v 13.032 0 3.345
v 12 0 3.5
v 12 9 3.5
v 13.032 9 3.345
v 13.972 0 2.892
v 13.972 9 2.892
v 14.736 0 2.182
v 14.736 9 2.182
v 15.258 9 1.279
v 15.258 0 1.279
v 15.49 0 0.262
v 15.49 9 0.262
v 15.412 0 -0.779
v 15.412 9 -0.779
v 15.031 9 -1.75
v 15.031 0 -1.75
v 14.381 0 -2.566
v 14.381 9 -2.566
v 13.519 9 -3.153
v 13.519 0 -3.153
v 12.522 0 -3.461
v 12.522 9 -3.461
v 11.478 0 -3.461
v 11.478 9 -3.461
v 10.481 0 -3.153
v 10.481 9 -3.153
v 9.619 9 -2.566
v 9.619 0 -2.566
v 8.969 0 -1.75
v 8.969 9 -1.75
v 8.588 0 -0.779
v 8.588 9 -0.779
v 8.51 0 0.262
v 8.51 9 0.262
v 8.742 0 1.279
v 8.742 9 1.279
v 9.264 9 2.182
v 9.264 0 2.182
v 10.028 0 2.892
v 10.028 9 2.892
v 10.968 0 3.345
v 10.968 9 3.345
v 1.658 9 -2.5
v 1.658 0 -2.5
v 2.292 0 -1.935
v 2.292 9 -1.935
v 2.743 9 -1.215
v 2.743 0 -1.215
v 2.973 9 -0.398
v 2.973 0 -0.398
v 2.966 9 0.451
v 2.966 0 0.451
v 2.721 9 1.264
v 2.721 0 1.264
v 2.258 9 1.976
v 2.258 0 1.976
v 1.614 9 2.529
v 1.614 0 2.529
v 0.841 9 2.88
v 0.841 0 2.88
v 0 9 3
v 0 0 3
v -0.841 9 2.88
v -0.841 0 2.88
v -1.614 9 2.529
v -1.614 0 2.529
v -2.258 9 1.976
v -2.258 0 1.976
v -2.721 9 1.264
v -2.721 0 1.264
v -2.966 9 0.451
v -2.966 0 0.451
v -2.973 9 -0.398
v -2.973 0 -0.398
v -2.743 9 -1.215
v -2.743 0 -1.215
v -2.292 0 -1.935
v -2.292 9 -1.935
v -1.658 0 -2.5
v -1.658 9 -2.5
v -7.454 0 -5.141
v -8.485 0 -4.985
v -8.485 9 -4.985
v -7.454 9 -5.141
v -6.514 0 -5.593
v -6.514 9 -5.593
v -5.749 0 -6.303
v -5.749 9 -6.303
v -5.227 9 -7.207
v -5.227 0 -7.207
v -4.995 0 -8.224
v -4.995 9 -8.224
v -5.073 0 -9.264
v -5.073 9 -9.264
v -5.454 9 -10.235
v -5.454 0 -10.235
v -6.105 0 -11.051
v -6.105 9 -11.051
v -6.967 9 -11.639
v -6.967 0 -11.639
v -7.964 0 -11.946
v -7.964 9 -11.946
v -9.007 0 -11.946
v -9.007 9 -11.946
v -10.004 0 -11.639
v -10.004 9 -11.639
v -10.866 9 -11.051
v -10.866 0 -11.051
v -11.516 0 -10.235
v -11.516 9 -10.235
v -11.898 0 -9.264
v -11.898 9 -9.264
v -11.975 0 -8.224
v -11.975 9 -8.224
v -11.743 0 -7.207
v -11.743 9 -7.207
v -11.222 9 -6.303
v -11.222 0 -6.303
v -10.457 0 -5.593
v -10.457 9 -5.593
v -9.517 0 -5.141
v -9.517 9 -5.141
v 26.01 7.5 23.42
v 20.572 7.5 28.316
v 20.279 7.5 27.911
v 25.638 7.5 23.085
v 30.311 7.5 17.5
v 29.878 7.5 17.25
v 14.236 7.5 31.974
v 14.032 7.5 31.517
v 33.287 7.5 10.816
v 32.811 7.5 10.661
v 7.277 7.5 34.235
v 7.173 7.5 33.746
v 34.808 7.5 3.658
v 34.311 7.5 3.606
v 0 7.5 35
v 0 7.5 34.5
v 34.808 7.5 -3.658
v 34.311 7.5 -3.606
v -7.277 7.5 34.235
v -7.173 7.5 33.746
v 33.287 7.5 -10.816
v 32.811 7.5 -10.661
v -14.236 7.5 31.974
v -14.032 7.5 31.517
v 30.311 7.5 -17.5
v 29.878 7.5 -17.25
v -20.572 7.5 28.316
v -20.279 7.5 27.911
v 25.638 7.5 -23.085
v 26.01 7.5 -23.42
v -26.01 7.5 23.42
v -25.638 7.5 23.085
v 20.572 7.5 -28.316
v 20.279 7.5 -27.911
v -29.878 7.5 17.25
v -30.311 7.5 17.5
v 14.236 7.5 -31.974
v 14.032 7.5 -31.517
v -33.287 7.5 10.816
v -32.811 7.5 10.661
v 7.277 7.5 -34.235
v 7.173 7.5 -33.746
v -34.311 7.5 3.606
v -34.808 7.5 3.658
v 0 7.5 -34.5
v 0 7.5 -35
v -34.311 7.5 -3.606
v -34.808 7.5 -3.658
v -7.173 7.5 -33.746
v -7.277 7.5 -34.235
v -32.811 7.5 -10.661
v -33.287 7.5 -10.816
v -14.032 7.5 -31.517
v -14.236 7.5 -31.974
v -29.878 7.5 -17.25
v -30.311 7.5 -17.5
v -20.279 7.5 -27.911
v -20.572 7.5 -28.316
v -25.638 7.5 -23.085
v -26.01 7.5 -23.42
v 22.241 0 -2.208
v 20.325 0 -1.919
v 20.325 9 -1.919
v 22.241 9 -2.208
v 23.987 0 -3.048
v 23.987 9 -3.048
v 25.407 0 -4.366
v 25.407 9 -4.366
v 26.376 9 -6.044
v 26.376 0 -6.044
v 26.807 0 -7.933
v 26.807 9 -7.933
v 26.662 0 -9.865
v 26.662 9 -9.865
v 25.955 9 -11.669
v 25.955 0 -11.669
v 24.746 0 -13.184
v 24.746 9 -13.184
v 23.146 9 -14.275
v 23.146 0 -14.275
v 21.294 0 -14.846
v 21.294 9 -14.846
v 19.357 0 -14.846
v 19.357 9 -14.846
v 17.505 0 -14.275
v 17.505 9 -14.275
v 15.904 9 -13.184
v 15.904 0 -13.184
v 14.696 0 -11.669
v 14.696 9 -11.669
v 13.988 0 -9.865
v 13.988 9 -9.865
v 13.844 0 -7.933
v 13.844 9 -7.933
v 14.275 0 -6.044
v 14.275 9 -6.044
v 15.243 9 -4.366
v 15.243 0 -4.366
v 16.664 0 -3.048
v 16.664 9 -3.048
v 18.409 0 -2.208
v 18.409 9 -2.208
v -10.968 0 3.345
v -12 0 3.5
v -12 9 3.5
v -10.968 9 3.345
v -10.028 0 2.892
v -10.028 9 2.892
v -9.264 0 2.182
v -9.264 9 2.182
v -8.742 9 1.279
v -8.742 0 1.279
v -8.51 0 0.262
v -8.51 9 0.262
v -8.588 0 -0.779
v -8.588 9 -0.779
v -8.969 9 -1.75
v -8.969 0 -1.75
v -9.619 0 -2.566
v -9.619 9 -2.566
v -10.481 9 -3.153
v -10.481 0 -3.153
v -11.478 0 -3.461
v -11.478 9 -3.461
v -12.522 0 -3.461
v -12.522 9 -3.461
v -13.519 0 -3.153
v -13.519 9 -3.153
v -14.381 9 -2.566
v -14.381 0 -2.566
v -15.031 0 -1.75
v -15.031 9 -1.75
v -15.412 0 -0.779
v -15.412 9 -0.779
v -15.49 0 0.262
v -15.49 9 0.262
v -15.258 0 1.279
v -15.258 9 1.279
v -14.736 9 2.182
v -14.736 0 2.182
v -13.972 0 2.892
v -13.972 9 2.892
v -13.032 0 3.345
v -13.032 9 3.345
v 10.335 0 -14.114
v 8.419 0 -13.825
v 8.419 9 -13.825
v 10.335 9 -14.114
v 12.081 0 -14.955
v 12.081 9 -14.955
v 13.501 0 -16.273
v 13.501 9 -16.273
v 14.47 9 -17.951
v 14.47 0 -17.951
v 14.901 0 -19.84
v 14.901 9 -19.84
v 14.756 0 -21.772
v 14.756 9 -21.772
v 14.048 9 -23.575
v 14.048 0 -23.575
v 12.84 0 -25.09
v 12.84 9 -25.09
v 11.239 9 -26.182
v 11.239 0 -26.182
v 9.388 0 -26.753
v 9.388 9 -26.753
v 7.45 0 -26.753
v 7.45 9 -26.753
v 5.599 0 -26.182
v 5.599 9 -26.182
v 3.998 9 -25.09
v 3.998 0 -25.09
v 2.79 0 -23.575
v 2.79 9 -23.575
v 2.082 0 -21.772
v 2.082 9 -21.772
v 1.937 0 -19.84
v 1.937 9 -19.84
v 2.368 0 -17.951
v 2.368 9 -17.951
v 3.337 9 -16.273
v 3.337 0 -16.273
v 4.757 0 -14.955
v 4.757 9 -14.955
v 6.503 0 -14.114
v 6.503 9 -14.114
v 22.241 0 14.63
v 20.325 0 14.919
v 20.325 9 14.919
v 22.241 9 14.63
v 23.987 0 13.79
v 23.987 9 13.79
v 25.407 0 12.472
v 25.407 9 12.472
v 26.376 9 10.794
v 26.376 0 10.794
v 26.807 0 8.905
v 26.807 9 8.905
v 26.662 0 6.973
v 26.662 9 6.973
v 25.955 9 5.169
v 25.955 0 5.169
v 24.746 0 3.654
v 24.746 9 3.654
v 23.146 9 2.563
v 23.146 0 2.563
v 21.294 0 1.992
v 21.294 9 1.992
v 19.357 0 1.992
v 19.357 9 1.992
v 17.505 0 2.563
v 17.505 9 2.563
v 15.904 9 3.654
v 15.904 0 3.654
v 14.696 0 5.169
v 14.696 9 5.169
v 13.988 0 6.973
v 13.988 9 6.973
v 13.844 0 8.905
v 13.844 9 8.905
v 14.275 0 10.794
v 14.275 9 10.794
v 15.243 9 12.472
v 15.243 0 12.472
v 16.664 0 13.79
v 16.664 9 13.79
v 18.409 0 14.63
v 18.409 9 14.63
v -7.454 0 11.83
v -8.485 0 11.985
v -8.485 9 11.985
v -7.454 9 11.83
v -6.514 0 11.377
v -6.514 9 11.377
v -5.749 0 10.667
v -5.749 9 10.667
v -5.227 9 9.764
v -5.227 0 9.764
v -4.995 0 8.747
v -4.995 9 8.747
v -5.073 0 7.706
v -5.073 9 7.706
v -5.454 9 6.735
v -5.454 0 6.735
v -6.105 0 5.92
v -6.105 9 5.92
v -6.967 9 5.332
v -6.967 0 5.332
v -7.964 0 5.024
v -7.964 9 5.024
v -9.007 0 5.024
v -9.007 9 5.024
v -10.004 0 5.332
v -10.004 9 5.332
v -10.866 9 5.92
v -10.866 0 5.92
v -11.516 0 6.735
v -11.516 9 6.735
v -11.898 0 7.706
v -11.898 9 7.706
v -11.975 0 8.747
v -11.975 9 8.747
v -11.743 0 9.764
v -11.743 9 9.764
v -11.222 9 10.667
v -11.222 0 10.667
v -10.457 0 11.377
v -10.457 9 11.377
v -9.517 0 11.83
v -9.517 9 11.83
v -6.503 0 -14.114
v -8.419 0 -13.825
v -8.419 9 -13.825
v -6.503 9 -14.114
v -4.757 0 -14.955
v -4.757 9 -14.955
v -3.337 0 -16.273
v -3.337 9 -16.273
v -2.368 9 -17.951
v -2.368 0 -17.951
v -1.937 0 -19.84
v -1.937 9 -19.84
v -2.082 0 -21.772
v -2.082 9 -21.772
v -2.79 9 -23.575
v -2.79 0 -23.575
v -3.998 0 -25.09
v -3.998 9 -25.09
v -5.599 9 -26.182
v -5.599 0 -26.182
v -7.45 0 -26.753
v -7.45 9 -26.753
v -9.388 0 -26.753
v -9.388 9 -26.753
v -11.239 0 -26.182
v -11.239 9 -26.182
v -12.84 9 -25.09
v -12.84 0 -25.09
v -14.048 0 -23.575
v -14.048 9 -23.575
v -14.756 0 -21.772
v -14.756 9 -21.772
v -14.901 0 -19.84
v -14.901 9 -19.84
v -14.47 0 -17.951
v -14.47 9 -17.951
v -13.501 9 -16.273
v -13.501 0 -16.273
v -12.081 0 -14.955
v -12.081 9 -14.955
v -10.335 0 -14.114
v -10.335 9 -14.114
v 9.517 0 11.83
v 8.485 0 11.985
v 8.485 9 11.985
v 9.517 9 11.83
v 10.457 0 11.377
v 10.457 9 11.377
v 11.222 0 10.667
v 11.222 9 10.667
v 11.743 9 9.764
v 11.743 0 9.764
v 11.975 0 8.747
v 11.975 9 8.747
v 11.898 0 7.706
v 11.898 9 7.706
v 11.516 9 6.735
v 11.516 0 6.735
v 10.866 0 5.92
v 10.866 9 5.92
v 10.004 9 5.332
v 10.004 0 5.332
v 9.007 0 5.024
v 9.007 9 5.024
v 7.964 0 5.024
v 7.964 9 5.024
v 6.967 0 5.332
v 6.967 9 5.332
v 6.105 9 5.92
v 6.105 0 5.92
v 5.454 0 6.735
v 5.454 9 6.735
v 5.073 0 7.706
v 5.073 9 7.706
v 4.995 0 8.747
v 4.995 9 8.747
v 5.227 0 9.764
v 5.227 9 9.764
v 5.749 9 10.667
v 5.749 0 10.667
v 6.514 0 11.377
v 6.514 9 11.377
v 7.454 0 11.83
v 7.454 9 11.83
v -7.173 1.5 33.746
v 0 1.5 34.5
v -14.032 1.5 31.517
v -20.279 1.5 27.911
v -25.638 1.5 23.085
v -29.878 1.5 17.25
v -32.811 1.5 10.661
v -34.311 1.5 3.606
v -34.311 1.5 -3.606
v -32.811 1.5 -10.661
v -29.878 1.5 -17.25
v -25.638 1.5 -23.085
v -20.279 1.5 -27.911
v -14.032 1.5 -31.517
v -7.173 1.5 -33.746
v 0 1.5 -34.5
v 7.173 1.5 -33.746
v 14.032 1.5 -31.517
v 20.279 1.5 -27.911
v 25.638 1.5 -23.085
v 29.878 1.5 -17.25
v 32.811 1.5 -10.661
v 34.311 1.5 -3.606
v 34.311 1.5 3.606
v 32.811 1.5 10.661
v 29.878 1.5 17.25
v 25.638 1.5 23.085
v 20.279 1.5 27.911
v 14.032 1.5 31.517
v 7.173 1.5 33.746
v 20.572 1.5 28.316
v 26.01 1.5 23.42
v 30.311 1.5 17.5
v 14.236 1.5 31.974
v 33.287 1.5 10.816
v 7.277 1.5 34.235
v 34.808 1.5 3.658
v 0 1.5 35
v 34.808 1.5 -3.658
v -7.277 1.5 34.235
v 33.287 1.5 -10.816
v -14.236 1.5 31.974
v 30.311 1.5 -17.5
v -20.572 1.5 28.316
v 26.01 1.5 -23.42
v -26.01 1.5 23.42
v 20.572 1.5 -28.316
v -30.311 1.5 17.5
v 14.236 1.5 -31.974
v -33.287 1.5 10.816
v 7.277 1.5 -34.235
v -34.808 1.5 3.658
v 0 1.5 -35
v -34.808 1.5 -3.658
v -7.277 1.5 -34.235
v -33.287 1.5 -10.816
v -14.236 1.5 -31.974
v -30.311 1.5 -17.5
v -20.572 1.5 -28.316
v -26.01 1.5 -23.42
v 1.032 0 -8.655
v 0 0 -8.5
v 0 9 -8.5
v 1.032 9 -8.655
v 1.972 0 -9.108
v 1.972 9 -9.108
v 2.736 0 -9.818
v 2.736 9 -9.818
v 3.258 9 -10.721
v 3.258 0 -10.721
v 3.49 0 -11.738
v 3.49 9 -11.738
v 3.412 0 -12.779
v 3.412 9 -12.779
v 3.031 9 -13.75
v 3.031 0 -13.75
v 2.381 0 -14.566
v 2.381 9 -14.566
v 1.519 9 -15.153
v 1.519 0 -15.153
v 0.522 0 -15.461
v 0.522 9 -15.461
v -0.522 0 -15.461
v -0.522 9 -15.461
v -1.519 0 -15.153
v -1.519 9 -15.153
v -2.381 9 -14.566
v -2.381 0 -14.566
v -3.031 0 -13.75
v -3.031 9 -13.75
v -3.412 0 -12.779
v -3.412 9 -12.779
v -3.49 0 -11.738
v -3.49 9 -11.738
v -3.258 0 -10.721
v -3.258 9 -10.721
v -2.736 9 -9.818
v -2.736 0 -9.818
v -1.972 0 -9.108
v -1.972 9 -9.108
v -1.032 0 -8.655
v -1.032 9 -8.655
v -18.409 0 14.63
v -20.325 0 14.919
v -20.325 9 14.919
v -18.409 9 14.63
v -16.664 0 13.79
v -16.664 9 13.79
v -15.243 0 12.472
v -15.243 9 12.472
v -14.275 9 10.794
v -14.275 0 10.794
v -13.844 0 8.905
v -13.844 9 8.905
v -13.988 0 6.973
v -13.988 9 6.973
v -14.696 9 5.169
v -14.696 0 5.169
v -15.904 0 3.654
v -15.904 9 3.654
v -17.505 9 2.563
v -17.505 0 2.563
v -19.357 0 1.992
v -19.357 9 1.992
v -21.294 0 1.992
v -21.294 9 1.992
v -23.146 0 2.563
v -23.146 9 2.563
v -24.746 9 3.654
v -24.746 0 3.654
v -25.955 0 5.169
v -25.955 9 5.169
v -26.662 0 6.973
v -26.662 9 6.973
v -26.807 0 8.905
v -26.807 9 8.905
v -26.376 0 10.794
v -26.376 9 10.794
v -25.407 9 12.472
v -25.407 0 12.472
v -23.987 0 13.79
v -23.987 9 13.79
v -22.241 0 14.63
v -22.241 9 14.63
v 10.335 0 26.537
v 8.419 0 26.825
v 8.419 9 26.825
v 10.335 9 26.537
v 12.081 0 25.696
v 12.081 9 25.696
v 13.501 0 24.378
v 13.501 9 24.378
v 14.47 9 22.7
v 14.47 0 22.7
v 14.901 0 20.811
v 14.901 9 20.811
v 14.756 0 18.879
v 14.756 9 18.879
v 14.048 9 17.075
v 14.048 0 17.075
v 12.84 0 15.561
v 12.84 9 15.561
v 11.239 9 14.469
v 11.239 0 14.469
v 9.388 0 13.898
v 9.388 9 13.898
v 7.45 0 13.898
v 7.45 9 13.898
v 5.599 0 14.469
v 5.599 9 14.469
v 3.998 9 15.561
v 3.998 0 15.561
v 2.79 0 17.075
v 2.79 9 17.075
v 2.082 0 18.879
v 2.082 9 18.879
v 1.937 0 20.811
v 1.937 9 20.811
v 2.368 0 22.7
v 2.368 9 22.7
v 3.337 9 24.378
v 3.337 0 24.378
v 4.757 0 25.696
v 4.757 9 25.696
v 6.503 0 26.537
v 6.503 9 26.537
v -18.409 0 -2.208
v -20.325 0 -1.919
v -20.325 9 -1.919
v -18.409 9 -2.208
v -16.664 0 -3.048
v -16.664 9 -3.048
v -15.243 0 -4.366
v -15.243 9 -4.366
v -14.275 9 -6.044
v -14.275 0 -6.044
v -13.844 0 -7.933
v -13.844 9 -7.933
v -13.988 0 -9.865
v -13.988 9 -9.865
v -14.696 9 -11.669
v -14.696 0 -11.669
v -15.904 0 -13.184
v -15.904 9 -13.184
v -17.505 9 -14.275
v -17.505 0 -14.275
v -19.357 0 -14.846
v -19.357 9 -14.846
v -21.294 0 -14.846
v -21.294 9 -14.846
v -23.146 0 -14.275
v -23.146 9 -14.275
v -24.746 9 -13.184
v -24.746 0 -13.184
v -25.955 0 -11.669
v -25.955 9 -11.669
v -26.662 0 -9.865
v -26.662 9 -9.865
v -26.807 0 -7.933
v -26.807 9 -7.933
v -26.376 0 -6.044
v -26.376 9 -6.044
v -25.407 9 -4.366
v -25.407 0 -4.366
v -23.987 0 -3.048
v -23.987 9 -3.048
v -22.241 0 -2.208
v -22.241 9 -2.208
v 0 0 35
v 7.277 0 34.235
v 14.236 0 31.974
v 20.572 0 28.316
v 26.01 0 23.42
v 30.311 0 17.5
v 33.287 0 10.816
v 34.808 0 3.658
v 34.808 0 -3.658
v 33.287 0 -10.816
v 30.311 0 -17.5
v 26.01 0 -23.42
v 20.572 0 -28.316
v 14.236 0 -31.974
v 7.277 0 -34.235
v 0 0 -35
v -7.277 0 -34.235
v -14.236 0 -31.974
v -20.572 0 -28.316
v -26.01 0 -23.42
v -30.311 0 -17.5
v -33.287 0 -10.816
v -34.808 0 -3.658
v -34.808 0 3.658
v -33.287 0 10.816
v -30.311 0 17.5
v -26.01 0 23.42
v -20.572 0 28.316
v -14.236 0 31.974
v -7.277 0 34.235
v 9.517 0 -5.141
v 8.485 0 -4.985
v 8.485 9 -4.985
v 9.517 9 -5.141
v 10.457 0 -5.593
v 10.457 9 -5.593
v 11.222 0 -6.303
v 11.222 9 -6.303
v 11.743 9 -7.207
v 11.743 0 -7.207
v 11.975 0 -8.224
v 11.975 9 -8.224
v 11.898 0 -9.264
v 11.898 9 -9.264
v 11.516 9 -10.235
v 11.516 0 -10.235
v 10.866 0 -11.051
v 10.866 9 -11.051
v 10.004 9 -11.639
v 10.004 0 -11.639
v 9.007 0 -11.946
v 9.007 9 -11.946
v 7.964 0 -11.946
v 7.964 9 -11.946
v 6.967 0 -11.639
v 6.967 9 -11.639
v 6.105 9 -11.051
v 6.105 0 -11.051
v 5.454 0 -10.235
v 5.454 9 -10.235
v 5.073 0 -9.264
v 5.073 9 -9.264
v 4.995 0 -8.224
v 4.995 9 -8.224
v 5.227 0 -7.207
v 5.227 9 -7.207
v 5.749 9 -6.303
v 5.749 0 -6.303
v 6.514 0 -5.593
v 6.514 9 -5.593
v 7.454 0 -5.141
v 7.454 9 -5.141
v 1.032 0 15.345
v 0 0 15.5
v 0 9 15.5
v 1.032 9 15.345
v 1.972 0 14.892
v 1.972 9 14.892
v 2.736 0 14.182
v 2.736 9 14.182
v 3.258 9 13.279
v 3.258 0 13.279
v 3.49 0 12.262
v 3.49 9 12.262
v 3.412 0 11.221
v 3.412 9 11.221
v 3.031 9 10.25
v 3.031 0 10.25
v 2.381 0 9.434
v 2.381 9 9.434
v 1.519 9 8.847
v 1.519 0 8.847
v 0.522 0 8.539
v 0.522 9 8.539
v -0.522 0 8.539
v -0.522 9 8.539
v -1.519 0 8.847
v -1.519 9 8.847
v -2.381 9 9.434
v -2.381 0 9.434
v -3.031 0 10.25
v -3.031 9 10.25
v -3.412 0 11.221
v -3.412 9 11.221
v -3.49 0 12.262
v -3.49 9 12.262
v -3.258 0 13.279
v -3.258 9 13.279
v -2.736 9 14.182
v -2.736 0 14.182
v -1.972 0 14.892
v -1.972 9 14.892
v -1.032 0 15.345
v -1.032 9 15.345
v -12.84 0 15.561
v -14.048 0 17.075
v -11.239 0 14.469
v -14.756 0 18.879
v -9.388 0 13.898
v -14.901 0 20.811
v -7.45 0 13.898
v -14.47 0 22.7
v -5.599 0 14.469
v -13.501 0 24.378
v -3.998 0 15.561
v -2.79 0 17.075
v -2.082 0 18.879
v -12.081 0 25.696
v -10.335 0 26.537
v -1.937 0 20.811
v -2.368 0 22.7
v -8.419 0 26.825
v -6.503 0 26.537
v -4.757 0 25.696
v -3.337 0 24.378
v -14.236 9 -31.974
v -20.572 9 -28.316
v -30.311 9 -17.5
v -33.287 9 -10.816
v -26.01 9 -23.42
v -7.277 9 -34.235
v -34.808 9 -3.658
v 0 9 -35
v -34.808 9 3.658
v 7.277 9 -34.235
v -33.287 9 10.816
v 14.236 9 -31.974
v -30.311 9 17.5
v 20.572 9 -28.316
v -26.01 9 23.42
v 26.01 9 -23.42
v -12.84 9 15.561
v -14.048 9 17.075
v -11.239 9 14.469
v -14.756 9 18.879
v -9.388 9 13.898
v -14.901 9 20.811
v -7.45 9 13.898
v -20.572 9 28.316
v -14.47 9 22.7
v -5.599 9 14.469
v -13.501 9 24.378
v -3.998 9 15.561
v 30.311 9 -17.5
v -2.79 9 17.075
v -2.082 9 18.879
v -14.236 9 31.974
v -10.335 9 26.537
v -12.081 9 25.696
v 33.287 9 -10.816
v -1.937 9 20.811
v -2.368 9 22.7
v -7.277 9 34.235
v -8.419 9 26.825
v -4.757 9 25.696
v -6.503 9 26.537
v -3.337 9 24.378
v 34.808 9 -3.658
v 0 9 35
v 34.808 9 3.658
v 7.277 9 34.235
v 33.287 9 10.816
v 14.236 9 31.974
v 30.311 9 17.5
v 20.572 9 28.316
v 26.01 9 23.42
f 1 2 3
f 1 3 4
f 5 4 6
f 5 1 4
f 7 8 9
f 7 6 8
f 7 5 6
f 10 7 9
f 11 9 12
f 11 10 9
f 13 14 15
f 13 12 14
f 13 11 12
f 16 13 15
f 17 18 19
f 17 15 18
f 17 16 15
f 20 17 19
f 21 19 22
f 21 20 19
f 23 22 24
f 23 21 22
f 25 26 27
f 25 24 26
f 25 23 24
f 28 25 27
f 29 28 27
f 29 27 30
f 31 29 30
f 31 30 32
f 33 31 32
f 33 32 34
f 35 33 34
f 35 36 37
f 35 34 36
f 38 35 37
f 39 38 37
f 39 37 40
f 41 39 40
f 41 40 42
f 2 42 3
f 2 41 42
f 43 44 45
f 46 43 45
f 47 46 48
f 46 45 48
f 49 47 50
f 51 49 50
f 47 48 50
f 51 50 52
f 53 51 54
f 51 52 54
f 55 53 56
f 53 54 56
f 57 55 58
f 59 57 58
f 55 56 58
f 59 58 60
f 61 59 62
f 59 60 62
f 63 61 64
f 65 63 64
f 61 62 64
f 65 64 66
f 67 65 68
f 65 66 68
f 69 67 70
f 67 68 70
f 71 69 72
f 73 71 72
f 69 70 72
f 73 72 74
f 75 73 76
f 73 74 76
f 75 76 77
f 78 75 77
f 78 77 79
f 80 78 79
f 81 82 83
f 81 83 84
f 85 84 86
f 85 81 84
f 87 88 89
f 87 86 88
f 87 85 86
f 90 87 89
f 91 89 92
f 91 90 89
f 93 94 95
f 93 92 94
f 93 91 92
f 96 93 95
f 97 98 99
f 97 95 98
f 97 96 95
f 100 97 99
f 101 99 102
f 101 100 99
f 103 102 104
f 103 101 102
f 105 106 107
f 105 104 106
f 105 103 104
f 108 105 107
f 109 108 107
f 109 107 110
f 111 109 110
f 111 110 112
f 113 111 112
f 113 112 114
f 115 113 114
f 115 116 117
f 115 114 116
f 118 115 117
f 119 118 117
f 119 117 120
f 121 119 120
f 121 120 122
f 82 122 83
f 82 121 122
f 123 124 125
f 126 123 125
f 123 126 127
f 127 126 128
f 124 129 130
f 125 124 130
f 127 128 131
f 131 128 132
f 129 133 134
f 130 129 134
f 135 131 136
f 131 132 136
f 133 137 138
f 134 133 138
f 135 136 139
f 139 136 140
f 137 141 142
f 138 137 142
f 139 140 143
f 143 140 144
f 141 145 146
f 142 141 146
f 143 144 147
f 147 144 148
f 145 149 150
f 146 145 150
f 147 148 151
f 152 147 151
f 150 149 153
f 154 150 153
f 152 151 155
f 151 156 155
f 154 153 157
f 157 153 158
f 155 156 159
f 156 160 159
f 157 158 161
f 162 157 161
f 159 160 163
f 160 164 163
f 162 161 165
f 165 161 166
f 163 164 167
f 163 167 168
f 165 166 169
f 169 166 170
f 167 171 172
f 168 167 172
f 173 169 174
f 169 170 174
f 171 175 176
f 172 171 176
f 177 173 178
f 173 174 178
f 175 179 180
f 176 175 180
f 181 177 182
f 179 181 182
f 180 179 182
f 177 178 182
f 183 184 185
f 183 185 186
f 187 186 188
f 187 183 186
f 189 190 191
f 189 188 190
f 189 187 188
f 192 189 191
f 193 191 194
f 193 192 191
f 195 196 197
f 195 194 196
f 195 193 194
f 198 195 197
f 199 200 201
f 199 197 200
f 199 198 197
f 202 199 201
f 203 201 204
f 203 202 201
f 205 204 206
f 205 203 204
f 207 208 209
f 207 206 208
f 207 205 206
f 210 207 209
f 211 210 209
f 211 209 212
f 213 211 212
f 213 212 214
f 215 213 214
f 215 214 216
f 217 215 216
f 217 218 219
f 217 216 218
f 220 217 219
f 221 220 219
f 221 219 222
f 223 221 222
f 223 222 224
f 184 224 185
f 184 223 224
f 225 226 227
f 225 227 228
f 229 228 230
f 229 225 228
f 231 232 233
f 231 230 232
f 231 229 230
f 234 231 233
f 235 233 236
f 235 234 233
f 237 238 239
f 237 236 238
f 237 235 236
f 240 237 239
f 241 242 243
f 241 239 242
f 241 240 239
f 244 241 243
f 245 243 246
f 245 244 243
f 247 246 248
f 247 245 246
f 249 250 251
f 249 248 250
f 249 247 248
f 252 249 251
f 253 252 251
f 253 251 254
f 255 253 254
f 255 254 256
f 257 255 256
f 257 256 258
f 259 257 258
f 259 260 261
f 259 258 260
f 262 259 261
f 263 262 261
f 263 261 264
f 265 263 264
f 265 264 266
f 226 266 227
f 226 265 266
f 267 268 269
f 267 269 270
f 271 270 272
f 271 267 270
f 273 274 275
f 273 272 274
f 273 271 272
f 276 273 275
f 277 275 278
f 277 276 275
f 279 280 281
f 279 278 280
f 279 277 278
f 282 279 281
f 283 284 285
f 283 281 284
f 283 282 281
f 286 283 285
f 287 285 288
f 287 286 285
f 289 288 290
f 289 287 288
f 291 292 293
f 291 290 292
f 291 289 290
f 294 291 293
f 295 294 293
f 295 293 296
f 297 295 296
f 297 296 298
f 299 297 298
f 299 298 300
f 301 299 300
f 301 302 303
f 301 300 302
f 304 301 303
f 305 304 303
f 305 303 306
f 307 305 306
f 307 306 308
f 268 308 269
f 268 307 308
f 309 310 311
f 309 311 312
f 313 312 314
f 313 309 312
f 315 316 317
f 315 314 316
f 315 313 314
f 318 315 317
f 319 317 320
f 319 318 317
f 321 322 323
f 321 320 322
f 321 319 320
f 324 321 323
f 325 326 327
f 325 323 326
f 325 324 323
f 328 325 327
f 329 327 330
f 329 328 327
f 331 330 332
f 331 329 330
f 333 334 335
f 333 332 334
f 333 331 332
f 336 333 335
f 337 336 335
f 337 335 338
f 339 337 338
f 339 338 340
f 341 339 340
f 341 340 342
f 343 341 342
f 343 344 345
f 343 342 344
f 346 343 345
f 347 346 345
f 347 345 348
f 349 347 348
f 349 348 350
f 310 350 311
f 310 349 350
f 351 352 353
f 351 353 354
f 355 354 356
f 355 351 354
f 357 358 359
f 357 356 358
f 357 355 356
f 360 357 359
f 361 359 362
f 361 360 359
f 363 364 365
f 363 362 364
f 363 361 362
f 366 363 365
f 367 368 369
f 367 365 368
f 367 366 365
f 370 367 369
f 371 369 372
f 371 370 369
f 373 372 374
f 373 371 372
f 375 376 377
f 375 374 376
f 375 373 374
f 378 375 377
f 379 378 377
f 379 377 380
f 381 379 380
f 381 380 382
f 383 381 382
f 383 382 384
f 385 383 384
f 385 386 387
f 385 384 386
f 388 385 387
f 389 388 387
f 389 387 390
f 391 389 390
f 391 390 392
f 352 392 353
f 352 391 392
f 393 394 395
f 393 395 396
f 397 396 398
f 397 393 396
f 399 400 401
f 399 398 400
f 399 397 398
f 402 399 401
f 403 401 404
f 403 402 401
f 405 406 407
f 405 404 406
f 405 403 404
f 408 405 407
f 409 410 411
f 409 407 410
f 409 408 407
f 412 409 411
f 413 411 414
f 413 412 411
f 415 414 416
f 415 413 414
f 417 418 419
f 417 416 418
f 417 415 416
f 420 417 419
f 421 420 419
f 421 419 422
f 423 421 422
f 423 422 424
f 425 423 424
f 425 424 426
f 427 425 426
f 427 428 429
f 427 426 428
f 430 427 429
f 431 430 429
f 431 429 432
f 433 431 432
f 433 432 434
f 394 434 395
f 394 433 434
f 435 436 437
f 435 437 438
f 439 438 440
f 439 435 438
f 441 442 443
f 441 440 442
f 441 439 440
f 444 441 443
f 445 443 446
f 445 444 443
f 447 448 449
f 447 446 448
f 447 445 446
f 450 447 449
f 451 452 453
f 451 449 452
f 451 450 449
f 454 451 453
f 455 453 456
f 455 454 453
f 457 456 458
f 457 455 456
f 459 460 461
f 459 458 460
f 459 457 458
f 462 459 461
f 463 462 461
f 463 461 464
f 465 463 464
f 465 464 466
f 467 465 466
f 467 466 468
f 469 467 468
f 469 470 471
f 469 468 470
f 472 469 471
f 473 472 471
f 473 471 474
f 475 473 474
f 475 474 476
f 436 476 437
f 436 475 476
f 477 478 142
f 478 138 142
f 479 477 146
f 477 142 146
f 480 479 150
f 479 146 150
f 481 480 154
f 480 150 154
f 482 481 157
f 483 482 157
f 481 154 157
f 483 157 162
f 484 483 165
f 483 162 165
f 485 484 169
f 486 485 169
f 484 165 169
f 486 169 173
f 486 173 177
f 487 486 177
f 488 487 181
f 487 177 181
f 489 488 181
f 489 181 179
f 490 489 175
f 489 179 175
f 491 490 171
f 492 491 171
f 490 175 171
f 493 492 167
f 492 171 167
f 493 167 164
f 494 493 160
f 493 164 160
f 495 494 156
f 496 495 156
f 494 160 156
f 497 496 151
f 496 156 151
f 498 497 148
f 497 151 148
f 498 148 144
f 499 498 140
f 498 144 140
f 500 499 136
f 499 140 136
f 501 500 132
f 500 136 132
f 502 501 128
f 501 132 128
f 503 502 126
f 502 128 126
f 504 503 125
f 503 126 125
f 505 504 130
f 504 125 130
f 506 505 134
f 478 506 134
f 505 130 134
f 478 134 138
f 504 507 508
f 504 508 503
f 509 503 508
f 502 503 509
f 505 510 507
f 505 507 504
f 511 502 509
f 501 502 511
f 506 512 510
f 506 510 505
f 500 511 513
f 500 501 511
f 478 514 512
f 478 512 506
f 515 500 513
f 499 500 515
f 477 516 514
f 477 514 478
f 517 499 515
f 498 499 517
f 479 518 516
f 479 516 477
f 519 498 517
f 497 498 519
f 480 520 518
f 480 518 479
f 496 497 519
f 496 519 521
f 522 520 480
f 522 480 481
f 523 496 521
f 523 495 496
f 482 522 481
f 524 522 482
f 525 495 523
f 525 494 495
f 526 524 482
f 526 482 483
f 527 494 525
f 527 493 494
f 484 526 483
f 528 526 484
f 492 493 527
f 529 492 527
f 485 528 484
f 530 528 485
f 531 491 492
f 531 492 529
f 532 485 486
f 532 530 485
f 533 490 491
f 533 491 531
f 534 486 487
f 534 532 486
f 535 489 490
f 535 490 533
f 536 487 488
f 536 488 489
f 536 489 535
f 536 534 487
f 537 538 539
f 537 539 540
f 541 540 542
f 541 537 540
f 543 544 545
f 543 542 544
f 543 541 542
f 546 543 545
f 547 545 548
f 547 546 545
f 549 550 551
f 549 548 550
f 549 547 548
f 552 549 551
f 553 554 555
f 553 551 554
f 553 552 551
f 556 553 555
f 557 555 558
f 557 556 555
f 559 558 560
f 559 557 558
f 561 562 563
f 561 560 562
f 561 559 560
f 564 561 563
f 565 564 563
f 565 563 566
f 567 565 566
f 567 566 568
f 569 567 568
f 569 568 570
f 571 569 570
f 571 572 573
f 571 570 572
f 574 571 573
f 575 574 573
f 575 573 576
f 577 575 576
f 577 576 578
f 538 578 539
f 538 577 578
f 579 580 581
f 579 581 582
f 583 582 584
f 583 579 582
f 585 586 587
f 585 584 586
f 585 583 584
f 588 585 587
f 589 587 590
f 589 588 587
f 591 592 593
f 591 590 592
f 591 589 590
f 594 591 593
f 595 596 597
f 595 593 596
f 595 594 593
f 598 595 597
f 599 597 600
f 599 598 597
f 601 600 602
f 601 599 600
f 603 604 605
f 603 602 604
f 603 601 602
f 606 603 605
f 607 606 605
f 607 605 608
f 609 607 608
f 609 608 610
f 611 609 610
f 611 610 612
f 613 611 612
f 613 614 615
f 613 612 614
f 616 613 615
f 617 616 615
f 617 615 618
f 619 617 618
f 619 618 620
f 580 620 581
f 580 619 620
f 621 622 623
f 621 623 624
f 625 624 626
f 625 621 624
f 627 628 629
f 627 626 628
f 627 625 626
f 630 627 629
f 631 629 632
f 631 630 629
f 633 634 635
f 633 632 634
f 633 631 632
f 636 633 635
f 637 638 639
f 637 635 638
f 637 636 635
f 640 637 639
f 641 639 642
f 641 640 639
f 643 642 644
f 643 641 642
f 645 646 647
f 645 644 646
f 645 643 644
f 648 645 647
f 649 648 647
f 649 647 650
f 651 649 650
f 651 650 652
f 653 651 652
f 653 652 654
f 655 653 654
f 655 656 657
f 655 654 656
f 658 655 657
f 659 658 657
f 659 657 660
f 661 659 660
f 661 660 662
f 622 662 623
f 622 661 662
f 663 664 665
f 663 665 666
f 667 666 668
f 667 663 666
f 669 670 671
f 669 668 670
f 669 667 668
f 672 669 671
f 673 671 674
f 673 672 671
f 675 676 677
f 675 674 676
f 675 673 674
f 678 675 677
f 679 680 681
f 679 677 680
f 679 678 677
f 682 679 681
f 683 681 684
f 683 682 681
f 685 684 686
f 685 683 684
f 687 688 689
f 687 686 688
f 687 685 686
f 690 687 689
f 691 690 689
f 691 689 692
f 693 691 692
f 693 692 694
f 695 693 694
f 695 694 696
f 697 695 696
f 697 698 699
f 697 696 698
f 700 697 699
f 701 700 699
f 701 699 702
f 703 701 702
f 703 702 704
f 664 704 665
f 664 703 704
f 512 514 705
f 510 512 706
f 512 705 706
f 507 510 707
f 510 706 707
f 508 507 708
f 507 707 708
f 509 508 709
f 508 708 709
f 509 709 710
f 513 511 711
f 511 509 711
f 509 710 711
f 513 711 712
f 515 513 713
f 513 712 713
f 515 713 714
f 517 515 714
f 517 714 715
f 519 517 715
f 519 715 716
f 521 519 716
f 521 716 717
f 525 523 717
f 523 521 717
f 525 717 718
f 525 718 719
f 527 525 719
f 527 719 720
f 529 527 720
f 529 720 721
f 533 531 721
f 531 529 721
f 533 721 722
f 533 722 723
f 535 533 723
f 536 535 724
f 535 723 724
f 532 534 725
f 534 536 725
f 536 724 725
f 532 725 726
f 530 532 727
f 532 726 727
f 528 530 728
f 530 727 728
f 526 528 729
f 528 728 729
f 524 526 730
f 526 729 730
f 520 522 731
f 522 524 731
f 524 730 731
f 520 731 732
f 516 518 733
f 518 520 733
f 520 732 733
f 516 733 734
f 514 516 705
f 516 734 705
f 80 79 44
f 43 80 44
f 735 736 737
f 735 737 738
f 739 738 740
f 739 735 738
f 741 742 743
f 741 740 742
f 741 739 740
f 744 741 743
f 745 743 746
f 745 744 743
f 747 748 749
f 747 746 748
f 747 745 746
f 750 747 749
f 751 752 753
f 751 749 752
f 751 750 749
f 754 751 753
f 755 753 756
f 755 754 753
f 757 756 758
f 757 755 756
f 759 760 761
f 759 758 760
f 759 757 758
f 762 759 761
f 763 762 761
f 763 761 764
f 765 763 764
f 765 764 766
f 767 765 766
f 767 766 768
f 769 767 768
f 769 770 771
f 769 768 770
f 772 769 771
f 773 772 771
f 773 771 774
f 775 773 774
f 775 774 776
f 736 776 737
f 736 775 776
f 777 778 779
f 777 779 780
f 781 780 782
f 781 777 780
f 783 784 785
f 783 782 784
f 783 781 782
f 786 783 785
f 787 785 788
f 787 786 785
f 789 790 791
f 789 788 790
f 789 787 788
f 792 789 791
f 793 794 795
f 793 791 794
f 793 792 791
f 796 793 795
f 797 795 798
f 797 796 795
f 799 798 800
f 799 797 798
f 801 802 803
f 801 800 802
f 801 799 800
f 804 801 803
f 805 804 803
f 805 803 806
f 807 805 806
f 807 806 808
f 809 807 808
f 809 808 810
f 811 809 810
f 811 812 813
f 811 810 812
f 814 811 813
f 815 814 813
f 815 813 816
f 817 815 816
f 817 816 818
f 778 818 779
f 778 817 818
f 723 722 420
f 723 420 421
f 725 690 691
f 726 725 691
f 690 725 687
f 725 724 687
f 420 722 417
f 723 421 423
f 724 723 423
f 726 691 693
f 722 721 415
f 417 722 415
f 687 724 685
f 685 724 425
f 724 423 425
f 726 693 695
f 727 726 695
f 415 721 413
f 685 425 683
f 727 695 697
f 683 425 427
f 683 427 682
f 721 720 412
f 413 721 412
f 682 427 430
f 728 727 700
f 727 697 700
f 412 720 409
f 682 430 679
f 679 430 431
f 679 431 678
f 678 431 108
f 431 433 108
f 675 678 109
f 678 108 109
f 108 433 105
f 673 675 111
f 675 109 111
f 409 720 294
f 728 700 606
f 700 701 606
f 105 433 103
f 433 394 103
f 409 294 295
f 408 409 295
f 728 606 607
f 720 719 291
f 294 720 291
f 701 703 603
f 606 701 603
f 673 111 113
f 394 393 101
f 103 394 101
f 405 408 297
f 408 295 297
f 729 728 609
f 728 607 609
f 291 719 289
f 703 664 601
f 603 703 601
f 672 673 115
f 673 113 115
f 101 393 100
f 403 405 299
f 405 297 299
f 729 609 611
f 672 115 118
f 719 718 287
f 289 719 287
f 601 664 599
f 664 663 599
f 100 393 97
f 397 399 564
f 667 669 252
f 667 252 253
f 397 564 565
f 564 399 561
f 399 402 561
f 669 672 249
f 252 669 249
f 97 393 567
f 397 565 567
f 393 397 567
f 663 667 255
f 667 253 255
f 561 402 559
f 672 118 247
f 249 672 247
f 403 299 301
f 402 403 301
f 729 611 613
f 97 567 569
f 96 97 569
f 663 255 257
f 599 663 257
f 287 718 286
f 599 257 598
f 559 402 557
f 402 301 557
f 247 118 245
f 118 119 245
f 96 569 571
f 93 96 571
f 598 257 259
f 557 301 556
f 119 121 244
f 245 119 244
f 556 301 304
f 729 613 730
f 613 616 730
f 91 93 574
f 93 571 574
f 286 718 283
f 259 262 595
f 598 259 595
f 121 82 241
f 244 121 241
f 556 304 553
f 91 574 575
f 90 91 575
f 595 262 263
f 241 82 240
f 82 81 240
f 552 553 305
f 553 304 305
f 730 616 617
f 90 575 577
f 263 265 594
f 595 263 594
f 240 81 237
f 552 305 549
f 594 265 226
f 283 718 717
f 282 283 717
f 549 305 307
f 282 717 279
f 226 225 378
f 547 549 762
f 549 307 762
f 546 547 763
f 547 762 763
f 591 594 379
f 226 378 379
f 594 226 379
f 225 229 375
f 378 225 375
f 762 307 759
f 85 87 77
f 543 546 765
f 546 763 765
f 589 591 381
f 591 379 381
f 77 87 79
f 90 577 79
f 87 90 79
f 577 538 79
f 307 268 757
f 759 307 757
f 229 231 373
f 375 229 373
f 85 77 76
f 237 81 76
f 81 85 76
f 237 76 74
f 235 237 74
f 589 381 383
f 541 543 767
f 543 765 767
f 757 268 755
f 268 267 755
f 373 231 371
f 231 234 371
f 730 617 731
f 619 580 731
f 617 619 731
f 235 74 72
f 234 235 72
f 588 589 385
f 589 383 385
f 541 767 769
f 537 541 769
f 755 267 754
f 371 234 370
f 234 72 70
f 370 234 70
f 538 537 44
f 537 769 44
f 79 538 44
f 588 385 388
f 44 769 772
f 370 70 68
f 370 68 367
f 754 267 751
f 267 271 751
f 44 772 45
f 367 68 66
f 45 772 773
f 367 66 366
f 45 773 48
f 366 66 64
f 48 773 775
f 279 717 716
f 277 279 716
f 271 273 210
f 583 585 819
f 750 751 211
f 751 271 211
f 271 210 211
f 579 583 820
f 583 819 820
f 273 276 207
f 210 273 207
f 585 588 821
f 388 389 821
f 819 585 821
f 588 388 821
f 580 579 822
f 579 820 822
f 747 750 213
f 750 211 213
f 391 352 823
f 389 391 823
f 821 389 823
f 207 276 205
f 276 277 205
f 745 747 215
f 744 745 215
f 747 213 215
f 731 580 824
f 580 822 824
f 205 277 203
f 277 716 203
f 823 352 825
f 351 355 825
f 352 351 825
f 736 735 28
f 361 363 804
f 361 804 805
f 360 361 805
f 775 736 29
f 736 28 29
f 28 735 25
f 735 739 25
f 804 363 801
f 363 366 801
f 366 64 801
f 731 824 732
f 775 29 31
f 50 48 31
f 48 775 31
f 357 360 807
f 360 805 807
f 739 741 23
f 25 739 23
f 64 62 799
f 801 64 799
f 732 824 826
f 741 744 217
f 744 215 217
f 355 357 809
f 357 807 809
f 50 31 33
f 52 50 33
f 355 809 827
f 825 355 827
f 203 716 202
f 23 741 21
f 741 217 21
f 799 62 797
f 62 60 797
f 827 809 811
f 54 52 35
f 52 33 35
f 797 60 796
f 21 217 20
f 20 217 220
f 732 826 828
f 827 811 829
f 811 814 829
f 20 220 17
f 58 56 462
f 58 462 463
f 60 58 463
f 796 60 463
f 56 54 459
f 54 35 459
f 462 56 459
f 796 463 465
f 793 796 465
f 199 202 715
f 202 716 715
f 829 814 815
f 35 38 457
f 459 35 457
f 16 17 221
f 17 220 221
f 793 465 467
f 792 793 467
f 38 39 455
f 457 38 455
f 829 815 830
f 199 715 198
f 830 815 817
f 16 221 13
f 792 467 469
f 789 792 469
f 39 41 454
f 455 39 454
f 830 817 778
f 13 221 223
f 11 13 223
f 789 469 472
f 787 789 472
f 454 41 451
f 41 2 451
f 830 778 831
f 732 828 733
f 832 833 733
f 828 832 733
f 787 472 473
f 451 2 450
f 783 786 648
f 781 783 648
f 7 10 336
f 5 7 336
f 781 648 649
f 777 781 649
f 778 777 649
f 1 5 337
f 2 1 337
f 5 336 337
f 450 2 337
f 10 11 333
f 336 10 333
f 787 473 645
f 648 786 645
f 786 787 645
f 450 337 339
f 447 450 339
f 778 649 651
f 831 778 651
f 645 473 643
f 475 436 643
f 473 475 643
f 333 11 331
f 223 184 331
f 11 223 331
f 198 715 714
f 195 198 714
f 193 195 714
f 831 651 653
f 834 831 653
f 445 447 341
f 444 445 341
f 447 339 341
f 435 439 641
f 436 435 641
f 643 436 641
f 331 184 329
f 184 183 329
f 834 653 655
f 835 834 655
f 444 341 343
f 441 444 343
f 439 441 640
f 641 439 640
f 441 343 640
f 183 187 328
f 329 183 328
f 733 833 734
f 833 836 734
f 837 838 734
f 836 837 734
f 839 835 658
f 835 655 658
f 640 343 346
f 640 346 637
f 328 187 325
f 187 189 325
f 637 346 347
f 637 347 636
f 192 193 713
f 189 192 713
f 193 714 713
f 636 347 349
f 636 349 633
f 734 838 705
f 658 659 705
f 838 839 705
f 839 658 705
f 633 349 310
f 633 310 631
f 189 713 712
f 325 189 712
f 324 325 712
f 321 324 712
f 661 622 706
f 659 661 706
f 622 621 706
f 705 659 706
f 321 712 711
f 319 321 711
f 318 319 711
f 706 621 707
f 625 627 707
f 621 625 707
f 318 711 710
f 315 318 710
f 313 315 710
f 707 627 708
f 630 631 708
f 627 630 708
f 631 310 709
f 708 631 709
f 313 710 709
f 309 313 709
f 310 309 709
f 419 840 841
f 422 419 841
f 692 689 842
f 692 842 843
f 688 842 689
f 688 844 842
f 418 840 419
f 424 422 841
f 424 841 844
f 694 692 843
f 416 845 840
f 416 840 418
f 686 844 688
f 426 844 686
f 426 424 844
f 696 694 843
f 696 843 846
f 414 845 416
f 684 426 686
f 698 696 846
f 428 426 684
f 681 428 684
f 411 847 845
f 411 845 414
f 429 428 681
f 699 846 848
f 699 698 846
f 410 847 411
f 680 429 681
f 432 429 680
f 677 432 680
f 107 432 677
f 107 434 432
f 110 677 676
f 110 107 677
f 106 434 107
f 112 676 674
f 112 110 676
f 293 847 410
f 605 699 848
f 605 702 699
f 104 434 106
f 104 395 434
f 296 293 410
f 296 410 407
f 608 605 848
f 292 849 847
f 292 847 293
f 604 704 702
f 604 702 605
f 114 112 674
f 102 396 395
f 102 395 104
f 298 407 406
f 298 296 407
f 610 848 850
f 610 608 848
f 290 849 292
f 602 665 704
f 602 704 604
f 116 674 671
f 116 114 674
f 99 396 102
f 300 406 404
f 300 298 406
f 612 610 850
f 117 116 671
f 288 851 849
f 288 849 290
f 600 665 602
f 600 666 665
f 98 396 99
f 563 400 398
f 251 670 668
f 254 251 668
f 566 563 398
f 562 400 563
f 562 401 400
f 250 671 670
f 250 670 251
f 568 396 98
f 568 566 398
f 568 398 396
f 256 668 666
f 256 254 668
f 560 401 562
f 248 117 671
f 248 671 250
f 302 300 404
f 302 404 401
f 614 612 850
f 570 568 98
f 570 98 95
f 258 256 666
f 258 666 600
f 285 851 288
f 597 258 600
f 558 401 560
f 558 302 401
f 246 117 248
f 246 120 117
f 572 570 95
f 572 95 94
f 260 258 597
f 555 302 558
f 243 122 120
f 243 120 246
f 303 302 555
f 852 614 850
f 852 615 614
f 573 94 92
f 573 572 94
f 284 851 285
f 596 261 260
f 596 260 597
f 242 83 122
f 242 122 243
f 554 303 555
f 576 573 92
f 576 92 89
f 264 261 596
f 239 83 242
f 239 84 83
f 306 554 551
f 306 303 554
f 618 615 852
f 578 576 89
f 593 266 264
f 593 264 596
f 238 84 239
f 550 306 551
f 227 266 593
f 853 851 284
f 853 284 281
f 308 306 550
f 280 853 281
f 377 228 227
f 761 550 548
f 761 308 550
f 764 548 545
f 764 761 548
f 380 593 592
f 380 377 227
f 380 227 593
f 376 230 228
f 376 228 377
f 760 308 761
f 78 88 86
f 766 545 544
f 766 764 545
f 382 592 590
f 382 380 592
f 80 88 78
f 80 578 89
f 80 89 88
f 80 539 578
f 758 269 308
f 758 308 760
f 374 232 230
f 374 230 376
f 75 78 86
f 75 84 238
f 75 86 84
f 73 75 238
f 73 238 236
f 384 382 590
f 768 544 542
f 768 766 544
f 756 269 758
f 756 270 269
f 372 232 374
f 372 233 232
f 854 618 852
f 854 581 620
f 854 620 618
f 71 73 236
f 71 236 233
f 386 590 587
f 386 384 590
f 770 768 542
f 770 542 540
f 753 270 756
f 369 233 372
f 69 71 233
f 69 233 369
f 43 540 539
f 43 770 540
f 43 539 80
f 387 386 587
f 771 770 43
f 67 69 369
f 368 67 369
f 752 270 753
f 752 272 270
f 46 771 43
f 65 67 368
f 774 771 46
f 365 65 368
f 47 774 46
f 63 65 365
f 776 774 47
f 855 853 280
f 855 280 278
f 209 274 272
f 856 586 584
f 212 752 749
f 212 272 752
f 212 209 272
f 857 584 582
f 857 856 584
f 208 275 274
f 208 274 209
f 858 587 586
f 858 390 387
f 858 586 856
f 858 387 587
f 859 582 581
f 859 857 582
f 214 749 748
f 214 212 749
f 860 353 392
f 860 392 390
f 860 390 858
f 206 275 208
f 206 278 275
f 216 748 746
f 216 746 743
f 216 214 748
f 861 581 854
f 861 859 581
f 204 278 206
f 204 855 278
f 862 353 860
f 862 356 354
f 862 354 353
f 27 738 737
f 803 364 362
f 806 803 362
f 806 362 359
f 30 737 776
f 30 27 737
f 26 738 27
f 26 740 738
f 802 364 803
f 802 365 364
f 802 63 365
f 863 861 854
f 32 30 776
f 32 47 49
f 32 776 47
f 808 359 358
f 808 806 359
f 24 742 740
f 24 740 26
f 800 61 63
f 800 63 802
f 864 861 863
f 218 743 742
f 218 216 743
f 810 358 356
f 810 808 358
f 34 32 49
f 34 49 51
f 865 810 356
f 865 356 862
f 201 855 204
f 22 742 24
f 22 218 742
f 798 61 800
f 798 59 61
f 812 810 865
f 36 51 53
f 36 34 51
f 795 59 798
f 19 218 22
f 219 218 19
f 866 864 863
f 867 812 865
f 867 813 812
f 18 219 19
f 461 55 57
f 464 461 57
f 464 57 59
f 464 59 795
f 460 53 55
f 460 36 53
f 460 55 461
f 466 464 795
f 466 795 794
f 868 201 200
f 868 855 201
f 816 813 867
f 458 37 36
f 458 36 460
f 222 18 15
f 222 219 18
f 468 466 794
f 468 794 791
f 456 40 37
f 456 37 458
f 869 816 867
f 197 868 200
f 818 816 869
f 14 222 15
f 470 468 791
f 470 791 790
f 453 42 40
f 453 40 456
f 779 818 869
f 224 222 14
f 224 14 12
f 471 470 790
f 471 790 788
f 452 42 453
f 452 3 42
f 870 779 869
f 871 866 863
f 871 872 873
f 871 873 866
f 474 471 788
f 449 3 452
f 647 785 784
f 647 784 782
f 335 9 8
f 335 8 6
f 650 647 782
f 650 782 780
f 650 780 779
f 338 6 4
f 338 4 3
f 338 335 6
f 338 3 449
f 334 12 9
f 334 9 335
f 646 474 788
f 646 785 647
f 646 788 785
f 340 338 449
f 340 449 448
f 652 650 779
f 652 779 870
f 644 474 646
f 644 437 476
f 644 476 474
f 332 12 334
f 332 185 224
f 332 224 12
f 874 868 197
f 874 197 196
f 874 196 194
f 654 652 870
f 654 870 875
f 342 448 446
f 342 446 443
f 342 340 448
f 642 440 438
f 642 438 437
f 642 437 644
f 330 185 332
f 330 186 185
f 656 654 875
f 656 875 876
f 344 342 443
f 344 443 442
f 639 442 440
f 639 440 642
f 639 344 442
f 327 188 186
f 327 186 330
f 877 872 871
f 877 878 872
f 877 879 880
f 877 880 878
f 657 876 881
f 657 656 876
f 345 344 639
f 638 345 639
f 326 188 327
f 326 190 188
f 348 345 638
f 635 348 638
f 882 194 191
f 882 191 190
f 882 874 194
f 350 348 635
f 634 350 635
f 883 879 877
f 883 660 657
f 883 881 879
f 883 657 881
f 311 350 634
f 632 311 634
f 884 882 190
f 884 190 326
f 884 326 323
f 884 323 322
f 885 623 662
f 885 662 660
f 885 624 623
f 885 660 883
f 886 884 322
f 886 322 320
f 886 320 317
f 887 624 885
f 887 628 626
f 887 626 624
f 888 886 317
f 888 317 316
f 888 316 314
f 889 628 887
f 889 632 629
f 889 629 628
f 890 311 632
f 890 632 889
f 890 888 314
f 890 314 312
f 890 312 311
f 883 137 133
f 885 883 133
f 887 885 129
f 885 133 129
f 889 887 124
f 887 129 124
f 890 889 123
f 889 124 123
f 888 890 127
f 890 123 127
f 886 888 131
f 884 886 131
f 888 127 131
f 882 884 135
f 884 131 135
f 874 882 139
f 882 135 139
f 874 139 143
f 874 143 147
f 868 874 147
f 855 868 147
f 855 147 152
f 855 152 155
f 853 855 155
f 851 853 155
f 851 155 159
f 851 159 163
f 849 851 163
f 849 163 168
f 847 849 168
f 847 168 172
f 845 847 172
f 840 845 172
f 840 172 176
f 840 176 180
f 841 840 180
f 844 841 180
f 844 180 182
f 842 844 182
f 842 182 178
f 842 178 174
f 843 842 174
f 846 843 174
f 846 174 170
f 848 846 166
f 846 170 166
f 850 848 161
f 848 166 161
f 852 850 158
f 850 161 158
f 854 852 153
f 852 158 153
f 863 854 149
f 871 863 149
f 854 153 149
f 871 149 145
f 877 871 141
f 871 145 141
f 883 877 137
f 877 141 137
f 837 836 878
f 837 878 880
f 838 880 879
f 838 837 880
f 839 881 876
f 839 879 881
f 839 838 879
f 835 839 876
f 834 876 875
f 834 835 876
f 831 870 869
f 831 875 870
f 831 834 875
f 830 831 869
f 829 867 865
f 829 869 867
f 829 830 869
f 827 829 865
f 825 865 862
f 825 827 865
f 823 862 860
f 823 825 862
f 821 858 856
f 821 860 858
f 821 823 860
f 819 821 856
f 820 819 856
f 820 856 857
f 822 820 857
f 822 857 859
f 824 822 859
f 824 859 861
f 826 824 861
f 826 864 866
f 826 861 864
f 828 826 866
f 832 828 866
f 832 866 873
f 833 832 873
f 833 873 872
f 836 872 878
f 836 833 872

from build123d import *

# Parameters (mm, degrees)
SKETCH_1_R               = 35
EXTRUDE_1_DEPTH          = 9
CUT_EXTRUDE_1_DEPTH      = 51.309044912
CUT_EXTRUDE_1_DEPTH_BACK = 51.309044912
CUT_EXTRUDE_2_DEPTH      = 51.309044912
CUT_EXTRUDE_2_DEPTH_BACK = 51.309044912
SKETCH_3_R               = 3.5
SKETCH_3_R_2             = 6.5
SKETCH_4_W               = 1
SKETCH_4_H               = 6


with BuildPart() as part:
    # 스케치1 → 보스-돌출1 (new body)
    with BuildSketch(Plane(origin=(0, 0, 0), x_dir=(1, 0, 0), z_dir=(0, 1, 0))):
        with Locations(Location((0, 0, 0), (0, 0, 270))):
            Circle(SKETCH_1_R)
    extrude(amount=EXTRUDE_1_DEPTH)

    # 스케치2 → 컷-돌출1 (cut, two sides: drawn at the far end of the back side and taken through both)
    with BuildSketch(Plane(origin=(0, 9, 0), x_dir=(1, 0, 0), z_dir=(0, 1, 0)).offset(-CUT_EXTRUDE_1_DEPTH_BACK)):
        with BuildLine():
            Line((-1.658312395, 2.5), (1.658312395, 2.5))
            ThreePointArc((1.658312395, 2.5), (0, -3), (-1.658312395, 2.5))
        make_face()
    extrude(amount=CUT_EXTRUDE_1_DEPTH + CUT_EXTRUDE_1_DEPTH_BACK, mode=Mode.SUBTRACT)

    # 스케치3 → 컷-돌출2 (cut, two sides: drawn at the far end of the back side and taken through both)
    with BuildSketch(Plane(origin=(0, 9, 0), x_dir=(1, 0, 0), z_dir=(0, 1, 0)).offset(-CUT_EXTRUDE_2_DEPTH_BACK)):
        with Locations(Location((8.485281374, -8.485281374, 0), (0, 0, 270))):
            Circle(SKETCH_3_R)
        with Locations(Location((8.419035512, -20.325349715, 0), (0, 0, 270))):
            Circle(SKETCH_3_R_2)
        with Locations(Location((-8.419035512, -20.325349715, 0), (0, 0, 270))):
            Circle(SKETCH_3_R_2)
        with Locations(Location((0, -12, 0), (0, 0, 270))):
            Circle(SKETCH_3_R)
        with Locations(Location((-20.325349715, -8.419035512, 0), (0, 0, 270))):
            Circle(SKETCH_3_R_2)
        with Locations(Location((-8.485281374, -8.485281374, 0), (0, 0, 270))):
            Circle(SKETCH_3_R)
        with Locations(Location((-20.325349715, 8.419035512, 0), (0, 0, 270))):
            Circle(SKETCH_3_R_2)
        with Locations(Location((-12, 0, 0), (0, 0, 270))):
            Circle(SKETCH_3_R)
        with Locations(Location((-8.419035512, 20.325349715, 0), (0, 0, 270))):
            Circle(SKETCH_3_R_2)
        with Locations(Location((-8.485281374, 8.485281374, 0), (0, 0, 270))):
            Circle(SKETCH_3_R)
        with Locations(Location((8.419035512, 20.325349715, 0), (0, 0, 270))):
            Circle(SKETCH_3_R_2)
        with Locations(Location((0, 12, 0), (0, 0, 270))):
            Circle(SKETCH_3_R)
        with Locations(Location((20.325349715, 8.419035512, 0), (0, 0, 270))):
            Circle(SKETCH_3_R_2)
        with Locations(Location((8.485281374, 8.485281374, 0), (0, 0, 270))):
            Circle(SKETCH_3_R)
        with Locations(Location((20.325349715, -8.419035512, 0), (0, 0, 270))):
            Circle(SKETCH_3_R_2)
        with Locations(Location((12, 0, 0), (0, 0, 270))):
            Circle(SKETCH_3_R)
    extrude(amount=CUT_EXTRUDE_2_DEPTH + CUT_EXTRUDE_2_DEPTH_BACK, mode=Mode.SUBTRACT)

    # 스케치4 → 컷-회전1 (revolve, cut)
    with BuildSketch(Plane(origin=(0, 0, 0), x_dir=(0, 0, -1), z_dir=(1, 0, 0)), mode=Mode.PRIVATE) as cut_revolve_1_sk:
        with Locations((35, 4.5)):
            Rectangle(SKETCH_4_W, SKETCH_4_H)
    revolve(cut_revolve_1_sk.sketch.rotate(Axis((0, 9, 0), (0, -1, 0)), 180), axis=Axis((0, 9, 0), (0, -1, 0)), mode=Mode.SUBTRACT)


solid = part.part
